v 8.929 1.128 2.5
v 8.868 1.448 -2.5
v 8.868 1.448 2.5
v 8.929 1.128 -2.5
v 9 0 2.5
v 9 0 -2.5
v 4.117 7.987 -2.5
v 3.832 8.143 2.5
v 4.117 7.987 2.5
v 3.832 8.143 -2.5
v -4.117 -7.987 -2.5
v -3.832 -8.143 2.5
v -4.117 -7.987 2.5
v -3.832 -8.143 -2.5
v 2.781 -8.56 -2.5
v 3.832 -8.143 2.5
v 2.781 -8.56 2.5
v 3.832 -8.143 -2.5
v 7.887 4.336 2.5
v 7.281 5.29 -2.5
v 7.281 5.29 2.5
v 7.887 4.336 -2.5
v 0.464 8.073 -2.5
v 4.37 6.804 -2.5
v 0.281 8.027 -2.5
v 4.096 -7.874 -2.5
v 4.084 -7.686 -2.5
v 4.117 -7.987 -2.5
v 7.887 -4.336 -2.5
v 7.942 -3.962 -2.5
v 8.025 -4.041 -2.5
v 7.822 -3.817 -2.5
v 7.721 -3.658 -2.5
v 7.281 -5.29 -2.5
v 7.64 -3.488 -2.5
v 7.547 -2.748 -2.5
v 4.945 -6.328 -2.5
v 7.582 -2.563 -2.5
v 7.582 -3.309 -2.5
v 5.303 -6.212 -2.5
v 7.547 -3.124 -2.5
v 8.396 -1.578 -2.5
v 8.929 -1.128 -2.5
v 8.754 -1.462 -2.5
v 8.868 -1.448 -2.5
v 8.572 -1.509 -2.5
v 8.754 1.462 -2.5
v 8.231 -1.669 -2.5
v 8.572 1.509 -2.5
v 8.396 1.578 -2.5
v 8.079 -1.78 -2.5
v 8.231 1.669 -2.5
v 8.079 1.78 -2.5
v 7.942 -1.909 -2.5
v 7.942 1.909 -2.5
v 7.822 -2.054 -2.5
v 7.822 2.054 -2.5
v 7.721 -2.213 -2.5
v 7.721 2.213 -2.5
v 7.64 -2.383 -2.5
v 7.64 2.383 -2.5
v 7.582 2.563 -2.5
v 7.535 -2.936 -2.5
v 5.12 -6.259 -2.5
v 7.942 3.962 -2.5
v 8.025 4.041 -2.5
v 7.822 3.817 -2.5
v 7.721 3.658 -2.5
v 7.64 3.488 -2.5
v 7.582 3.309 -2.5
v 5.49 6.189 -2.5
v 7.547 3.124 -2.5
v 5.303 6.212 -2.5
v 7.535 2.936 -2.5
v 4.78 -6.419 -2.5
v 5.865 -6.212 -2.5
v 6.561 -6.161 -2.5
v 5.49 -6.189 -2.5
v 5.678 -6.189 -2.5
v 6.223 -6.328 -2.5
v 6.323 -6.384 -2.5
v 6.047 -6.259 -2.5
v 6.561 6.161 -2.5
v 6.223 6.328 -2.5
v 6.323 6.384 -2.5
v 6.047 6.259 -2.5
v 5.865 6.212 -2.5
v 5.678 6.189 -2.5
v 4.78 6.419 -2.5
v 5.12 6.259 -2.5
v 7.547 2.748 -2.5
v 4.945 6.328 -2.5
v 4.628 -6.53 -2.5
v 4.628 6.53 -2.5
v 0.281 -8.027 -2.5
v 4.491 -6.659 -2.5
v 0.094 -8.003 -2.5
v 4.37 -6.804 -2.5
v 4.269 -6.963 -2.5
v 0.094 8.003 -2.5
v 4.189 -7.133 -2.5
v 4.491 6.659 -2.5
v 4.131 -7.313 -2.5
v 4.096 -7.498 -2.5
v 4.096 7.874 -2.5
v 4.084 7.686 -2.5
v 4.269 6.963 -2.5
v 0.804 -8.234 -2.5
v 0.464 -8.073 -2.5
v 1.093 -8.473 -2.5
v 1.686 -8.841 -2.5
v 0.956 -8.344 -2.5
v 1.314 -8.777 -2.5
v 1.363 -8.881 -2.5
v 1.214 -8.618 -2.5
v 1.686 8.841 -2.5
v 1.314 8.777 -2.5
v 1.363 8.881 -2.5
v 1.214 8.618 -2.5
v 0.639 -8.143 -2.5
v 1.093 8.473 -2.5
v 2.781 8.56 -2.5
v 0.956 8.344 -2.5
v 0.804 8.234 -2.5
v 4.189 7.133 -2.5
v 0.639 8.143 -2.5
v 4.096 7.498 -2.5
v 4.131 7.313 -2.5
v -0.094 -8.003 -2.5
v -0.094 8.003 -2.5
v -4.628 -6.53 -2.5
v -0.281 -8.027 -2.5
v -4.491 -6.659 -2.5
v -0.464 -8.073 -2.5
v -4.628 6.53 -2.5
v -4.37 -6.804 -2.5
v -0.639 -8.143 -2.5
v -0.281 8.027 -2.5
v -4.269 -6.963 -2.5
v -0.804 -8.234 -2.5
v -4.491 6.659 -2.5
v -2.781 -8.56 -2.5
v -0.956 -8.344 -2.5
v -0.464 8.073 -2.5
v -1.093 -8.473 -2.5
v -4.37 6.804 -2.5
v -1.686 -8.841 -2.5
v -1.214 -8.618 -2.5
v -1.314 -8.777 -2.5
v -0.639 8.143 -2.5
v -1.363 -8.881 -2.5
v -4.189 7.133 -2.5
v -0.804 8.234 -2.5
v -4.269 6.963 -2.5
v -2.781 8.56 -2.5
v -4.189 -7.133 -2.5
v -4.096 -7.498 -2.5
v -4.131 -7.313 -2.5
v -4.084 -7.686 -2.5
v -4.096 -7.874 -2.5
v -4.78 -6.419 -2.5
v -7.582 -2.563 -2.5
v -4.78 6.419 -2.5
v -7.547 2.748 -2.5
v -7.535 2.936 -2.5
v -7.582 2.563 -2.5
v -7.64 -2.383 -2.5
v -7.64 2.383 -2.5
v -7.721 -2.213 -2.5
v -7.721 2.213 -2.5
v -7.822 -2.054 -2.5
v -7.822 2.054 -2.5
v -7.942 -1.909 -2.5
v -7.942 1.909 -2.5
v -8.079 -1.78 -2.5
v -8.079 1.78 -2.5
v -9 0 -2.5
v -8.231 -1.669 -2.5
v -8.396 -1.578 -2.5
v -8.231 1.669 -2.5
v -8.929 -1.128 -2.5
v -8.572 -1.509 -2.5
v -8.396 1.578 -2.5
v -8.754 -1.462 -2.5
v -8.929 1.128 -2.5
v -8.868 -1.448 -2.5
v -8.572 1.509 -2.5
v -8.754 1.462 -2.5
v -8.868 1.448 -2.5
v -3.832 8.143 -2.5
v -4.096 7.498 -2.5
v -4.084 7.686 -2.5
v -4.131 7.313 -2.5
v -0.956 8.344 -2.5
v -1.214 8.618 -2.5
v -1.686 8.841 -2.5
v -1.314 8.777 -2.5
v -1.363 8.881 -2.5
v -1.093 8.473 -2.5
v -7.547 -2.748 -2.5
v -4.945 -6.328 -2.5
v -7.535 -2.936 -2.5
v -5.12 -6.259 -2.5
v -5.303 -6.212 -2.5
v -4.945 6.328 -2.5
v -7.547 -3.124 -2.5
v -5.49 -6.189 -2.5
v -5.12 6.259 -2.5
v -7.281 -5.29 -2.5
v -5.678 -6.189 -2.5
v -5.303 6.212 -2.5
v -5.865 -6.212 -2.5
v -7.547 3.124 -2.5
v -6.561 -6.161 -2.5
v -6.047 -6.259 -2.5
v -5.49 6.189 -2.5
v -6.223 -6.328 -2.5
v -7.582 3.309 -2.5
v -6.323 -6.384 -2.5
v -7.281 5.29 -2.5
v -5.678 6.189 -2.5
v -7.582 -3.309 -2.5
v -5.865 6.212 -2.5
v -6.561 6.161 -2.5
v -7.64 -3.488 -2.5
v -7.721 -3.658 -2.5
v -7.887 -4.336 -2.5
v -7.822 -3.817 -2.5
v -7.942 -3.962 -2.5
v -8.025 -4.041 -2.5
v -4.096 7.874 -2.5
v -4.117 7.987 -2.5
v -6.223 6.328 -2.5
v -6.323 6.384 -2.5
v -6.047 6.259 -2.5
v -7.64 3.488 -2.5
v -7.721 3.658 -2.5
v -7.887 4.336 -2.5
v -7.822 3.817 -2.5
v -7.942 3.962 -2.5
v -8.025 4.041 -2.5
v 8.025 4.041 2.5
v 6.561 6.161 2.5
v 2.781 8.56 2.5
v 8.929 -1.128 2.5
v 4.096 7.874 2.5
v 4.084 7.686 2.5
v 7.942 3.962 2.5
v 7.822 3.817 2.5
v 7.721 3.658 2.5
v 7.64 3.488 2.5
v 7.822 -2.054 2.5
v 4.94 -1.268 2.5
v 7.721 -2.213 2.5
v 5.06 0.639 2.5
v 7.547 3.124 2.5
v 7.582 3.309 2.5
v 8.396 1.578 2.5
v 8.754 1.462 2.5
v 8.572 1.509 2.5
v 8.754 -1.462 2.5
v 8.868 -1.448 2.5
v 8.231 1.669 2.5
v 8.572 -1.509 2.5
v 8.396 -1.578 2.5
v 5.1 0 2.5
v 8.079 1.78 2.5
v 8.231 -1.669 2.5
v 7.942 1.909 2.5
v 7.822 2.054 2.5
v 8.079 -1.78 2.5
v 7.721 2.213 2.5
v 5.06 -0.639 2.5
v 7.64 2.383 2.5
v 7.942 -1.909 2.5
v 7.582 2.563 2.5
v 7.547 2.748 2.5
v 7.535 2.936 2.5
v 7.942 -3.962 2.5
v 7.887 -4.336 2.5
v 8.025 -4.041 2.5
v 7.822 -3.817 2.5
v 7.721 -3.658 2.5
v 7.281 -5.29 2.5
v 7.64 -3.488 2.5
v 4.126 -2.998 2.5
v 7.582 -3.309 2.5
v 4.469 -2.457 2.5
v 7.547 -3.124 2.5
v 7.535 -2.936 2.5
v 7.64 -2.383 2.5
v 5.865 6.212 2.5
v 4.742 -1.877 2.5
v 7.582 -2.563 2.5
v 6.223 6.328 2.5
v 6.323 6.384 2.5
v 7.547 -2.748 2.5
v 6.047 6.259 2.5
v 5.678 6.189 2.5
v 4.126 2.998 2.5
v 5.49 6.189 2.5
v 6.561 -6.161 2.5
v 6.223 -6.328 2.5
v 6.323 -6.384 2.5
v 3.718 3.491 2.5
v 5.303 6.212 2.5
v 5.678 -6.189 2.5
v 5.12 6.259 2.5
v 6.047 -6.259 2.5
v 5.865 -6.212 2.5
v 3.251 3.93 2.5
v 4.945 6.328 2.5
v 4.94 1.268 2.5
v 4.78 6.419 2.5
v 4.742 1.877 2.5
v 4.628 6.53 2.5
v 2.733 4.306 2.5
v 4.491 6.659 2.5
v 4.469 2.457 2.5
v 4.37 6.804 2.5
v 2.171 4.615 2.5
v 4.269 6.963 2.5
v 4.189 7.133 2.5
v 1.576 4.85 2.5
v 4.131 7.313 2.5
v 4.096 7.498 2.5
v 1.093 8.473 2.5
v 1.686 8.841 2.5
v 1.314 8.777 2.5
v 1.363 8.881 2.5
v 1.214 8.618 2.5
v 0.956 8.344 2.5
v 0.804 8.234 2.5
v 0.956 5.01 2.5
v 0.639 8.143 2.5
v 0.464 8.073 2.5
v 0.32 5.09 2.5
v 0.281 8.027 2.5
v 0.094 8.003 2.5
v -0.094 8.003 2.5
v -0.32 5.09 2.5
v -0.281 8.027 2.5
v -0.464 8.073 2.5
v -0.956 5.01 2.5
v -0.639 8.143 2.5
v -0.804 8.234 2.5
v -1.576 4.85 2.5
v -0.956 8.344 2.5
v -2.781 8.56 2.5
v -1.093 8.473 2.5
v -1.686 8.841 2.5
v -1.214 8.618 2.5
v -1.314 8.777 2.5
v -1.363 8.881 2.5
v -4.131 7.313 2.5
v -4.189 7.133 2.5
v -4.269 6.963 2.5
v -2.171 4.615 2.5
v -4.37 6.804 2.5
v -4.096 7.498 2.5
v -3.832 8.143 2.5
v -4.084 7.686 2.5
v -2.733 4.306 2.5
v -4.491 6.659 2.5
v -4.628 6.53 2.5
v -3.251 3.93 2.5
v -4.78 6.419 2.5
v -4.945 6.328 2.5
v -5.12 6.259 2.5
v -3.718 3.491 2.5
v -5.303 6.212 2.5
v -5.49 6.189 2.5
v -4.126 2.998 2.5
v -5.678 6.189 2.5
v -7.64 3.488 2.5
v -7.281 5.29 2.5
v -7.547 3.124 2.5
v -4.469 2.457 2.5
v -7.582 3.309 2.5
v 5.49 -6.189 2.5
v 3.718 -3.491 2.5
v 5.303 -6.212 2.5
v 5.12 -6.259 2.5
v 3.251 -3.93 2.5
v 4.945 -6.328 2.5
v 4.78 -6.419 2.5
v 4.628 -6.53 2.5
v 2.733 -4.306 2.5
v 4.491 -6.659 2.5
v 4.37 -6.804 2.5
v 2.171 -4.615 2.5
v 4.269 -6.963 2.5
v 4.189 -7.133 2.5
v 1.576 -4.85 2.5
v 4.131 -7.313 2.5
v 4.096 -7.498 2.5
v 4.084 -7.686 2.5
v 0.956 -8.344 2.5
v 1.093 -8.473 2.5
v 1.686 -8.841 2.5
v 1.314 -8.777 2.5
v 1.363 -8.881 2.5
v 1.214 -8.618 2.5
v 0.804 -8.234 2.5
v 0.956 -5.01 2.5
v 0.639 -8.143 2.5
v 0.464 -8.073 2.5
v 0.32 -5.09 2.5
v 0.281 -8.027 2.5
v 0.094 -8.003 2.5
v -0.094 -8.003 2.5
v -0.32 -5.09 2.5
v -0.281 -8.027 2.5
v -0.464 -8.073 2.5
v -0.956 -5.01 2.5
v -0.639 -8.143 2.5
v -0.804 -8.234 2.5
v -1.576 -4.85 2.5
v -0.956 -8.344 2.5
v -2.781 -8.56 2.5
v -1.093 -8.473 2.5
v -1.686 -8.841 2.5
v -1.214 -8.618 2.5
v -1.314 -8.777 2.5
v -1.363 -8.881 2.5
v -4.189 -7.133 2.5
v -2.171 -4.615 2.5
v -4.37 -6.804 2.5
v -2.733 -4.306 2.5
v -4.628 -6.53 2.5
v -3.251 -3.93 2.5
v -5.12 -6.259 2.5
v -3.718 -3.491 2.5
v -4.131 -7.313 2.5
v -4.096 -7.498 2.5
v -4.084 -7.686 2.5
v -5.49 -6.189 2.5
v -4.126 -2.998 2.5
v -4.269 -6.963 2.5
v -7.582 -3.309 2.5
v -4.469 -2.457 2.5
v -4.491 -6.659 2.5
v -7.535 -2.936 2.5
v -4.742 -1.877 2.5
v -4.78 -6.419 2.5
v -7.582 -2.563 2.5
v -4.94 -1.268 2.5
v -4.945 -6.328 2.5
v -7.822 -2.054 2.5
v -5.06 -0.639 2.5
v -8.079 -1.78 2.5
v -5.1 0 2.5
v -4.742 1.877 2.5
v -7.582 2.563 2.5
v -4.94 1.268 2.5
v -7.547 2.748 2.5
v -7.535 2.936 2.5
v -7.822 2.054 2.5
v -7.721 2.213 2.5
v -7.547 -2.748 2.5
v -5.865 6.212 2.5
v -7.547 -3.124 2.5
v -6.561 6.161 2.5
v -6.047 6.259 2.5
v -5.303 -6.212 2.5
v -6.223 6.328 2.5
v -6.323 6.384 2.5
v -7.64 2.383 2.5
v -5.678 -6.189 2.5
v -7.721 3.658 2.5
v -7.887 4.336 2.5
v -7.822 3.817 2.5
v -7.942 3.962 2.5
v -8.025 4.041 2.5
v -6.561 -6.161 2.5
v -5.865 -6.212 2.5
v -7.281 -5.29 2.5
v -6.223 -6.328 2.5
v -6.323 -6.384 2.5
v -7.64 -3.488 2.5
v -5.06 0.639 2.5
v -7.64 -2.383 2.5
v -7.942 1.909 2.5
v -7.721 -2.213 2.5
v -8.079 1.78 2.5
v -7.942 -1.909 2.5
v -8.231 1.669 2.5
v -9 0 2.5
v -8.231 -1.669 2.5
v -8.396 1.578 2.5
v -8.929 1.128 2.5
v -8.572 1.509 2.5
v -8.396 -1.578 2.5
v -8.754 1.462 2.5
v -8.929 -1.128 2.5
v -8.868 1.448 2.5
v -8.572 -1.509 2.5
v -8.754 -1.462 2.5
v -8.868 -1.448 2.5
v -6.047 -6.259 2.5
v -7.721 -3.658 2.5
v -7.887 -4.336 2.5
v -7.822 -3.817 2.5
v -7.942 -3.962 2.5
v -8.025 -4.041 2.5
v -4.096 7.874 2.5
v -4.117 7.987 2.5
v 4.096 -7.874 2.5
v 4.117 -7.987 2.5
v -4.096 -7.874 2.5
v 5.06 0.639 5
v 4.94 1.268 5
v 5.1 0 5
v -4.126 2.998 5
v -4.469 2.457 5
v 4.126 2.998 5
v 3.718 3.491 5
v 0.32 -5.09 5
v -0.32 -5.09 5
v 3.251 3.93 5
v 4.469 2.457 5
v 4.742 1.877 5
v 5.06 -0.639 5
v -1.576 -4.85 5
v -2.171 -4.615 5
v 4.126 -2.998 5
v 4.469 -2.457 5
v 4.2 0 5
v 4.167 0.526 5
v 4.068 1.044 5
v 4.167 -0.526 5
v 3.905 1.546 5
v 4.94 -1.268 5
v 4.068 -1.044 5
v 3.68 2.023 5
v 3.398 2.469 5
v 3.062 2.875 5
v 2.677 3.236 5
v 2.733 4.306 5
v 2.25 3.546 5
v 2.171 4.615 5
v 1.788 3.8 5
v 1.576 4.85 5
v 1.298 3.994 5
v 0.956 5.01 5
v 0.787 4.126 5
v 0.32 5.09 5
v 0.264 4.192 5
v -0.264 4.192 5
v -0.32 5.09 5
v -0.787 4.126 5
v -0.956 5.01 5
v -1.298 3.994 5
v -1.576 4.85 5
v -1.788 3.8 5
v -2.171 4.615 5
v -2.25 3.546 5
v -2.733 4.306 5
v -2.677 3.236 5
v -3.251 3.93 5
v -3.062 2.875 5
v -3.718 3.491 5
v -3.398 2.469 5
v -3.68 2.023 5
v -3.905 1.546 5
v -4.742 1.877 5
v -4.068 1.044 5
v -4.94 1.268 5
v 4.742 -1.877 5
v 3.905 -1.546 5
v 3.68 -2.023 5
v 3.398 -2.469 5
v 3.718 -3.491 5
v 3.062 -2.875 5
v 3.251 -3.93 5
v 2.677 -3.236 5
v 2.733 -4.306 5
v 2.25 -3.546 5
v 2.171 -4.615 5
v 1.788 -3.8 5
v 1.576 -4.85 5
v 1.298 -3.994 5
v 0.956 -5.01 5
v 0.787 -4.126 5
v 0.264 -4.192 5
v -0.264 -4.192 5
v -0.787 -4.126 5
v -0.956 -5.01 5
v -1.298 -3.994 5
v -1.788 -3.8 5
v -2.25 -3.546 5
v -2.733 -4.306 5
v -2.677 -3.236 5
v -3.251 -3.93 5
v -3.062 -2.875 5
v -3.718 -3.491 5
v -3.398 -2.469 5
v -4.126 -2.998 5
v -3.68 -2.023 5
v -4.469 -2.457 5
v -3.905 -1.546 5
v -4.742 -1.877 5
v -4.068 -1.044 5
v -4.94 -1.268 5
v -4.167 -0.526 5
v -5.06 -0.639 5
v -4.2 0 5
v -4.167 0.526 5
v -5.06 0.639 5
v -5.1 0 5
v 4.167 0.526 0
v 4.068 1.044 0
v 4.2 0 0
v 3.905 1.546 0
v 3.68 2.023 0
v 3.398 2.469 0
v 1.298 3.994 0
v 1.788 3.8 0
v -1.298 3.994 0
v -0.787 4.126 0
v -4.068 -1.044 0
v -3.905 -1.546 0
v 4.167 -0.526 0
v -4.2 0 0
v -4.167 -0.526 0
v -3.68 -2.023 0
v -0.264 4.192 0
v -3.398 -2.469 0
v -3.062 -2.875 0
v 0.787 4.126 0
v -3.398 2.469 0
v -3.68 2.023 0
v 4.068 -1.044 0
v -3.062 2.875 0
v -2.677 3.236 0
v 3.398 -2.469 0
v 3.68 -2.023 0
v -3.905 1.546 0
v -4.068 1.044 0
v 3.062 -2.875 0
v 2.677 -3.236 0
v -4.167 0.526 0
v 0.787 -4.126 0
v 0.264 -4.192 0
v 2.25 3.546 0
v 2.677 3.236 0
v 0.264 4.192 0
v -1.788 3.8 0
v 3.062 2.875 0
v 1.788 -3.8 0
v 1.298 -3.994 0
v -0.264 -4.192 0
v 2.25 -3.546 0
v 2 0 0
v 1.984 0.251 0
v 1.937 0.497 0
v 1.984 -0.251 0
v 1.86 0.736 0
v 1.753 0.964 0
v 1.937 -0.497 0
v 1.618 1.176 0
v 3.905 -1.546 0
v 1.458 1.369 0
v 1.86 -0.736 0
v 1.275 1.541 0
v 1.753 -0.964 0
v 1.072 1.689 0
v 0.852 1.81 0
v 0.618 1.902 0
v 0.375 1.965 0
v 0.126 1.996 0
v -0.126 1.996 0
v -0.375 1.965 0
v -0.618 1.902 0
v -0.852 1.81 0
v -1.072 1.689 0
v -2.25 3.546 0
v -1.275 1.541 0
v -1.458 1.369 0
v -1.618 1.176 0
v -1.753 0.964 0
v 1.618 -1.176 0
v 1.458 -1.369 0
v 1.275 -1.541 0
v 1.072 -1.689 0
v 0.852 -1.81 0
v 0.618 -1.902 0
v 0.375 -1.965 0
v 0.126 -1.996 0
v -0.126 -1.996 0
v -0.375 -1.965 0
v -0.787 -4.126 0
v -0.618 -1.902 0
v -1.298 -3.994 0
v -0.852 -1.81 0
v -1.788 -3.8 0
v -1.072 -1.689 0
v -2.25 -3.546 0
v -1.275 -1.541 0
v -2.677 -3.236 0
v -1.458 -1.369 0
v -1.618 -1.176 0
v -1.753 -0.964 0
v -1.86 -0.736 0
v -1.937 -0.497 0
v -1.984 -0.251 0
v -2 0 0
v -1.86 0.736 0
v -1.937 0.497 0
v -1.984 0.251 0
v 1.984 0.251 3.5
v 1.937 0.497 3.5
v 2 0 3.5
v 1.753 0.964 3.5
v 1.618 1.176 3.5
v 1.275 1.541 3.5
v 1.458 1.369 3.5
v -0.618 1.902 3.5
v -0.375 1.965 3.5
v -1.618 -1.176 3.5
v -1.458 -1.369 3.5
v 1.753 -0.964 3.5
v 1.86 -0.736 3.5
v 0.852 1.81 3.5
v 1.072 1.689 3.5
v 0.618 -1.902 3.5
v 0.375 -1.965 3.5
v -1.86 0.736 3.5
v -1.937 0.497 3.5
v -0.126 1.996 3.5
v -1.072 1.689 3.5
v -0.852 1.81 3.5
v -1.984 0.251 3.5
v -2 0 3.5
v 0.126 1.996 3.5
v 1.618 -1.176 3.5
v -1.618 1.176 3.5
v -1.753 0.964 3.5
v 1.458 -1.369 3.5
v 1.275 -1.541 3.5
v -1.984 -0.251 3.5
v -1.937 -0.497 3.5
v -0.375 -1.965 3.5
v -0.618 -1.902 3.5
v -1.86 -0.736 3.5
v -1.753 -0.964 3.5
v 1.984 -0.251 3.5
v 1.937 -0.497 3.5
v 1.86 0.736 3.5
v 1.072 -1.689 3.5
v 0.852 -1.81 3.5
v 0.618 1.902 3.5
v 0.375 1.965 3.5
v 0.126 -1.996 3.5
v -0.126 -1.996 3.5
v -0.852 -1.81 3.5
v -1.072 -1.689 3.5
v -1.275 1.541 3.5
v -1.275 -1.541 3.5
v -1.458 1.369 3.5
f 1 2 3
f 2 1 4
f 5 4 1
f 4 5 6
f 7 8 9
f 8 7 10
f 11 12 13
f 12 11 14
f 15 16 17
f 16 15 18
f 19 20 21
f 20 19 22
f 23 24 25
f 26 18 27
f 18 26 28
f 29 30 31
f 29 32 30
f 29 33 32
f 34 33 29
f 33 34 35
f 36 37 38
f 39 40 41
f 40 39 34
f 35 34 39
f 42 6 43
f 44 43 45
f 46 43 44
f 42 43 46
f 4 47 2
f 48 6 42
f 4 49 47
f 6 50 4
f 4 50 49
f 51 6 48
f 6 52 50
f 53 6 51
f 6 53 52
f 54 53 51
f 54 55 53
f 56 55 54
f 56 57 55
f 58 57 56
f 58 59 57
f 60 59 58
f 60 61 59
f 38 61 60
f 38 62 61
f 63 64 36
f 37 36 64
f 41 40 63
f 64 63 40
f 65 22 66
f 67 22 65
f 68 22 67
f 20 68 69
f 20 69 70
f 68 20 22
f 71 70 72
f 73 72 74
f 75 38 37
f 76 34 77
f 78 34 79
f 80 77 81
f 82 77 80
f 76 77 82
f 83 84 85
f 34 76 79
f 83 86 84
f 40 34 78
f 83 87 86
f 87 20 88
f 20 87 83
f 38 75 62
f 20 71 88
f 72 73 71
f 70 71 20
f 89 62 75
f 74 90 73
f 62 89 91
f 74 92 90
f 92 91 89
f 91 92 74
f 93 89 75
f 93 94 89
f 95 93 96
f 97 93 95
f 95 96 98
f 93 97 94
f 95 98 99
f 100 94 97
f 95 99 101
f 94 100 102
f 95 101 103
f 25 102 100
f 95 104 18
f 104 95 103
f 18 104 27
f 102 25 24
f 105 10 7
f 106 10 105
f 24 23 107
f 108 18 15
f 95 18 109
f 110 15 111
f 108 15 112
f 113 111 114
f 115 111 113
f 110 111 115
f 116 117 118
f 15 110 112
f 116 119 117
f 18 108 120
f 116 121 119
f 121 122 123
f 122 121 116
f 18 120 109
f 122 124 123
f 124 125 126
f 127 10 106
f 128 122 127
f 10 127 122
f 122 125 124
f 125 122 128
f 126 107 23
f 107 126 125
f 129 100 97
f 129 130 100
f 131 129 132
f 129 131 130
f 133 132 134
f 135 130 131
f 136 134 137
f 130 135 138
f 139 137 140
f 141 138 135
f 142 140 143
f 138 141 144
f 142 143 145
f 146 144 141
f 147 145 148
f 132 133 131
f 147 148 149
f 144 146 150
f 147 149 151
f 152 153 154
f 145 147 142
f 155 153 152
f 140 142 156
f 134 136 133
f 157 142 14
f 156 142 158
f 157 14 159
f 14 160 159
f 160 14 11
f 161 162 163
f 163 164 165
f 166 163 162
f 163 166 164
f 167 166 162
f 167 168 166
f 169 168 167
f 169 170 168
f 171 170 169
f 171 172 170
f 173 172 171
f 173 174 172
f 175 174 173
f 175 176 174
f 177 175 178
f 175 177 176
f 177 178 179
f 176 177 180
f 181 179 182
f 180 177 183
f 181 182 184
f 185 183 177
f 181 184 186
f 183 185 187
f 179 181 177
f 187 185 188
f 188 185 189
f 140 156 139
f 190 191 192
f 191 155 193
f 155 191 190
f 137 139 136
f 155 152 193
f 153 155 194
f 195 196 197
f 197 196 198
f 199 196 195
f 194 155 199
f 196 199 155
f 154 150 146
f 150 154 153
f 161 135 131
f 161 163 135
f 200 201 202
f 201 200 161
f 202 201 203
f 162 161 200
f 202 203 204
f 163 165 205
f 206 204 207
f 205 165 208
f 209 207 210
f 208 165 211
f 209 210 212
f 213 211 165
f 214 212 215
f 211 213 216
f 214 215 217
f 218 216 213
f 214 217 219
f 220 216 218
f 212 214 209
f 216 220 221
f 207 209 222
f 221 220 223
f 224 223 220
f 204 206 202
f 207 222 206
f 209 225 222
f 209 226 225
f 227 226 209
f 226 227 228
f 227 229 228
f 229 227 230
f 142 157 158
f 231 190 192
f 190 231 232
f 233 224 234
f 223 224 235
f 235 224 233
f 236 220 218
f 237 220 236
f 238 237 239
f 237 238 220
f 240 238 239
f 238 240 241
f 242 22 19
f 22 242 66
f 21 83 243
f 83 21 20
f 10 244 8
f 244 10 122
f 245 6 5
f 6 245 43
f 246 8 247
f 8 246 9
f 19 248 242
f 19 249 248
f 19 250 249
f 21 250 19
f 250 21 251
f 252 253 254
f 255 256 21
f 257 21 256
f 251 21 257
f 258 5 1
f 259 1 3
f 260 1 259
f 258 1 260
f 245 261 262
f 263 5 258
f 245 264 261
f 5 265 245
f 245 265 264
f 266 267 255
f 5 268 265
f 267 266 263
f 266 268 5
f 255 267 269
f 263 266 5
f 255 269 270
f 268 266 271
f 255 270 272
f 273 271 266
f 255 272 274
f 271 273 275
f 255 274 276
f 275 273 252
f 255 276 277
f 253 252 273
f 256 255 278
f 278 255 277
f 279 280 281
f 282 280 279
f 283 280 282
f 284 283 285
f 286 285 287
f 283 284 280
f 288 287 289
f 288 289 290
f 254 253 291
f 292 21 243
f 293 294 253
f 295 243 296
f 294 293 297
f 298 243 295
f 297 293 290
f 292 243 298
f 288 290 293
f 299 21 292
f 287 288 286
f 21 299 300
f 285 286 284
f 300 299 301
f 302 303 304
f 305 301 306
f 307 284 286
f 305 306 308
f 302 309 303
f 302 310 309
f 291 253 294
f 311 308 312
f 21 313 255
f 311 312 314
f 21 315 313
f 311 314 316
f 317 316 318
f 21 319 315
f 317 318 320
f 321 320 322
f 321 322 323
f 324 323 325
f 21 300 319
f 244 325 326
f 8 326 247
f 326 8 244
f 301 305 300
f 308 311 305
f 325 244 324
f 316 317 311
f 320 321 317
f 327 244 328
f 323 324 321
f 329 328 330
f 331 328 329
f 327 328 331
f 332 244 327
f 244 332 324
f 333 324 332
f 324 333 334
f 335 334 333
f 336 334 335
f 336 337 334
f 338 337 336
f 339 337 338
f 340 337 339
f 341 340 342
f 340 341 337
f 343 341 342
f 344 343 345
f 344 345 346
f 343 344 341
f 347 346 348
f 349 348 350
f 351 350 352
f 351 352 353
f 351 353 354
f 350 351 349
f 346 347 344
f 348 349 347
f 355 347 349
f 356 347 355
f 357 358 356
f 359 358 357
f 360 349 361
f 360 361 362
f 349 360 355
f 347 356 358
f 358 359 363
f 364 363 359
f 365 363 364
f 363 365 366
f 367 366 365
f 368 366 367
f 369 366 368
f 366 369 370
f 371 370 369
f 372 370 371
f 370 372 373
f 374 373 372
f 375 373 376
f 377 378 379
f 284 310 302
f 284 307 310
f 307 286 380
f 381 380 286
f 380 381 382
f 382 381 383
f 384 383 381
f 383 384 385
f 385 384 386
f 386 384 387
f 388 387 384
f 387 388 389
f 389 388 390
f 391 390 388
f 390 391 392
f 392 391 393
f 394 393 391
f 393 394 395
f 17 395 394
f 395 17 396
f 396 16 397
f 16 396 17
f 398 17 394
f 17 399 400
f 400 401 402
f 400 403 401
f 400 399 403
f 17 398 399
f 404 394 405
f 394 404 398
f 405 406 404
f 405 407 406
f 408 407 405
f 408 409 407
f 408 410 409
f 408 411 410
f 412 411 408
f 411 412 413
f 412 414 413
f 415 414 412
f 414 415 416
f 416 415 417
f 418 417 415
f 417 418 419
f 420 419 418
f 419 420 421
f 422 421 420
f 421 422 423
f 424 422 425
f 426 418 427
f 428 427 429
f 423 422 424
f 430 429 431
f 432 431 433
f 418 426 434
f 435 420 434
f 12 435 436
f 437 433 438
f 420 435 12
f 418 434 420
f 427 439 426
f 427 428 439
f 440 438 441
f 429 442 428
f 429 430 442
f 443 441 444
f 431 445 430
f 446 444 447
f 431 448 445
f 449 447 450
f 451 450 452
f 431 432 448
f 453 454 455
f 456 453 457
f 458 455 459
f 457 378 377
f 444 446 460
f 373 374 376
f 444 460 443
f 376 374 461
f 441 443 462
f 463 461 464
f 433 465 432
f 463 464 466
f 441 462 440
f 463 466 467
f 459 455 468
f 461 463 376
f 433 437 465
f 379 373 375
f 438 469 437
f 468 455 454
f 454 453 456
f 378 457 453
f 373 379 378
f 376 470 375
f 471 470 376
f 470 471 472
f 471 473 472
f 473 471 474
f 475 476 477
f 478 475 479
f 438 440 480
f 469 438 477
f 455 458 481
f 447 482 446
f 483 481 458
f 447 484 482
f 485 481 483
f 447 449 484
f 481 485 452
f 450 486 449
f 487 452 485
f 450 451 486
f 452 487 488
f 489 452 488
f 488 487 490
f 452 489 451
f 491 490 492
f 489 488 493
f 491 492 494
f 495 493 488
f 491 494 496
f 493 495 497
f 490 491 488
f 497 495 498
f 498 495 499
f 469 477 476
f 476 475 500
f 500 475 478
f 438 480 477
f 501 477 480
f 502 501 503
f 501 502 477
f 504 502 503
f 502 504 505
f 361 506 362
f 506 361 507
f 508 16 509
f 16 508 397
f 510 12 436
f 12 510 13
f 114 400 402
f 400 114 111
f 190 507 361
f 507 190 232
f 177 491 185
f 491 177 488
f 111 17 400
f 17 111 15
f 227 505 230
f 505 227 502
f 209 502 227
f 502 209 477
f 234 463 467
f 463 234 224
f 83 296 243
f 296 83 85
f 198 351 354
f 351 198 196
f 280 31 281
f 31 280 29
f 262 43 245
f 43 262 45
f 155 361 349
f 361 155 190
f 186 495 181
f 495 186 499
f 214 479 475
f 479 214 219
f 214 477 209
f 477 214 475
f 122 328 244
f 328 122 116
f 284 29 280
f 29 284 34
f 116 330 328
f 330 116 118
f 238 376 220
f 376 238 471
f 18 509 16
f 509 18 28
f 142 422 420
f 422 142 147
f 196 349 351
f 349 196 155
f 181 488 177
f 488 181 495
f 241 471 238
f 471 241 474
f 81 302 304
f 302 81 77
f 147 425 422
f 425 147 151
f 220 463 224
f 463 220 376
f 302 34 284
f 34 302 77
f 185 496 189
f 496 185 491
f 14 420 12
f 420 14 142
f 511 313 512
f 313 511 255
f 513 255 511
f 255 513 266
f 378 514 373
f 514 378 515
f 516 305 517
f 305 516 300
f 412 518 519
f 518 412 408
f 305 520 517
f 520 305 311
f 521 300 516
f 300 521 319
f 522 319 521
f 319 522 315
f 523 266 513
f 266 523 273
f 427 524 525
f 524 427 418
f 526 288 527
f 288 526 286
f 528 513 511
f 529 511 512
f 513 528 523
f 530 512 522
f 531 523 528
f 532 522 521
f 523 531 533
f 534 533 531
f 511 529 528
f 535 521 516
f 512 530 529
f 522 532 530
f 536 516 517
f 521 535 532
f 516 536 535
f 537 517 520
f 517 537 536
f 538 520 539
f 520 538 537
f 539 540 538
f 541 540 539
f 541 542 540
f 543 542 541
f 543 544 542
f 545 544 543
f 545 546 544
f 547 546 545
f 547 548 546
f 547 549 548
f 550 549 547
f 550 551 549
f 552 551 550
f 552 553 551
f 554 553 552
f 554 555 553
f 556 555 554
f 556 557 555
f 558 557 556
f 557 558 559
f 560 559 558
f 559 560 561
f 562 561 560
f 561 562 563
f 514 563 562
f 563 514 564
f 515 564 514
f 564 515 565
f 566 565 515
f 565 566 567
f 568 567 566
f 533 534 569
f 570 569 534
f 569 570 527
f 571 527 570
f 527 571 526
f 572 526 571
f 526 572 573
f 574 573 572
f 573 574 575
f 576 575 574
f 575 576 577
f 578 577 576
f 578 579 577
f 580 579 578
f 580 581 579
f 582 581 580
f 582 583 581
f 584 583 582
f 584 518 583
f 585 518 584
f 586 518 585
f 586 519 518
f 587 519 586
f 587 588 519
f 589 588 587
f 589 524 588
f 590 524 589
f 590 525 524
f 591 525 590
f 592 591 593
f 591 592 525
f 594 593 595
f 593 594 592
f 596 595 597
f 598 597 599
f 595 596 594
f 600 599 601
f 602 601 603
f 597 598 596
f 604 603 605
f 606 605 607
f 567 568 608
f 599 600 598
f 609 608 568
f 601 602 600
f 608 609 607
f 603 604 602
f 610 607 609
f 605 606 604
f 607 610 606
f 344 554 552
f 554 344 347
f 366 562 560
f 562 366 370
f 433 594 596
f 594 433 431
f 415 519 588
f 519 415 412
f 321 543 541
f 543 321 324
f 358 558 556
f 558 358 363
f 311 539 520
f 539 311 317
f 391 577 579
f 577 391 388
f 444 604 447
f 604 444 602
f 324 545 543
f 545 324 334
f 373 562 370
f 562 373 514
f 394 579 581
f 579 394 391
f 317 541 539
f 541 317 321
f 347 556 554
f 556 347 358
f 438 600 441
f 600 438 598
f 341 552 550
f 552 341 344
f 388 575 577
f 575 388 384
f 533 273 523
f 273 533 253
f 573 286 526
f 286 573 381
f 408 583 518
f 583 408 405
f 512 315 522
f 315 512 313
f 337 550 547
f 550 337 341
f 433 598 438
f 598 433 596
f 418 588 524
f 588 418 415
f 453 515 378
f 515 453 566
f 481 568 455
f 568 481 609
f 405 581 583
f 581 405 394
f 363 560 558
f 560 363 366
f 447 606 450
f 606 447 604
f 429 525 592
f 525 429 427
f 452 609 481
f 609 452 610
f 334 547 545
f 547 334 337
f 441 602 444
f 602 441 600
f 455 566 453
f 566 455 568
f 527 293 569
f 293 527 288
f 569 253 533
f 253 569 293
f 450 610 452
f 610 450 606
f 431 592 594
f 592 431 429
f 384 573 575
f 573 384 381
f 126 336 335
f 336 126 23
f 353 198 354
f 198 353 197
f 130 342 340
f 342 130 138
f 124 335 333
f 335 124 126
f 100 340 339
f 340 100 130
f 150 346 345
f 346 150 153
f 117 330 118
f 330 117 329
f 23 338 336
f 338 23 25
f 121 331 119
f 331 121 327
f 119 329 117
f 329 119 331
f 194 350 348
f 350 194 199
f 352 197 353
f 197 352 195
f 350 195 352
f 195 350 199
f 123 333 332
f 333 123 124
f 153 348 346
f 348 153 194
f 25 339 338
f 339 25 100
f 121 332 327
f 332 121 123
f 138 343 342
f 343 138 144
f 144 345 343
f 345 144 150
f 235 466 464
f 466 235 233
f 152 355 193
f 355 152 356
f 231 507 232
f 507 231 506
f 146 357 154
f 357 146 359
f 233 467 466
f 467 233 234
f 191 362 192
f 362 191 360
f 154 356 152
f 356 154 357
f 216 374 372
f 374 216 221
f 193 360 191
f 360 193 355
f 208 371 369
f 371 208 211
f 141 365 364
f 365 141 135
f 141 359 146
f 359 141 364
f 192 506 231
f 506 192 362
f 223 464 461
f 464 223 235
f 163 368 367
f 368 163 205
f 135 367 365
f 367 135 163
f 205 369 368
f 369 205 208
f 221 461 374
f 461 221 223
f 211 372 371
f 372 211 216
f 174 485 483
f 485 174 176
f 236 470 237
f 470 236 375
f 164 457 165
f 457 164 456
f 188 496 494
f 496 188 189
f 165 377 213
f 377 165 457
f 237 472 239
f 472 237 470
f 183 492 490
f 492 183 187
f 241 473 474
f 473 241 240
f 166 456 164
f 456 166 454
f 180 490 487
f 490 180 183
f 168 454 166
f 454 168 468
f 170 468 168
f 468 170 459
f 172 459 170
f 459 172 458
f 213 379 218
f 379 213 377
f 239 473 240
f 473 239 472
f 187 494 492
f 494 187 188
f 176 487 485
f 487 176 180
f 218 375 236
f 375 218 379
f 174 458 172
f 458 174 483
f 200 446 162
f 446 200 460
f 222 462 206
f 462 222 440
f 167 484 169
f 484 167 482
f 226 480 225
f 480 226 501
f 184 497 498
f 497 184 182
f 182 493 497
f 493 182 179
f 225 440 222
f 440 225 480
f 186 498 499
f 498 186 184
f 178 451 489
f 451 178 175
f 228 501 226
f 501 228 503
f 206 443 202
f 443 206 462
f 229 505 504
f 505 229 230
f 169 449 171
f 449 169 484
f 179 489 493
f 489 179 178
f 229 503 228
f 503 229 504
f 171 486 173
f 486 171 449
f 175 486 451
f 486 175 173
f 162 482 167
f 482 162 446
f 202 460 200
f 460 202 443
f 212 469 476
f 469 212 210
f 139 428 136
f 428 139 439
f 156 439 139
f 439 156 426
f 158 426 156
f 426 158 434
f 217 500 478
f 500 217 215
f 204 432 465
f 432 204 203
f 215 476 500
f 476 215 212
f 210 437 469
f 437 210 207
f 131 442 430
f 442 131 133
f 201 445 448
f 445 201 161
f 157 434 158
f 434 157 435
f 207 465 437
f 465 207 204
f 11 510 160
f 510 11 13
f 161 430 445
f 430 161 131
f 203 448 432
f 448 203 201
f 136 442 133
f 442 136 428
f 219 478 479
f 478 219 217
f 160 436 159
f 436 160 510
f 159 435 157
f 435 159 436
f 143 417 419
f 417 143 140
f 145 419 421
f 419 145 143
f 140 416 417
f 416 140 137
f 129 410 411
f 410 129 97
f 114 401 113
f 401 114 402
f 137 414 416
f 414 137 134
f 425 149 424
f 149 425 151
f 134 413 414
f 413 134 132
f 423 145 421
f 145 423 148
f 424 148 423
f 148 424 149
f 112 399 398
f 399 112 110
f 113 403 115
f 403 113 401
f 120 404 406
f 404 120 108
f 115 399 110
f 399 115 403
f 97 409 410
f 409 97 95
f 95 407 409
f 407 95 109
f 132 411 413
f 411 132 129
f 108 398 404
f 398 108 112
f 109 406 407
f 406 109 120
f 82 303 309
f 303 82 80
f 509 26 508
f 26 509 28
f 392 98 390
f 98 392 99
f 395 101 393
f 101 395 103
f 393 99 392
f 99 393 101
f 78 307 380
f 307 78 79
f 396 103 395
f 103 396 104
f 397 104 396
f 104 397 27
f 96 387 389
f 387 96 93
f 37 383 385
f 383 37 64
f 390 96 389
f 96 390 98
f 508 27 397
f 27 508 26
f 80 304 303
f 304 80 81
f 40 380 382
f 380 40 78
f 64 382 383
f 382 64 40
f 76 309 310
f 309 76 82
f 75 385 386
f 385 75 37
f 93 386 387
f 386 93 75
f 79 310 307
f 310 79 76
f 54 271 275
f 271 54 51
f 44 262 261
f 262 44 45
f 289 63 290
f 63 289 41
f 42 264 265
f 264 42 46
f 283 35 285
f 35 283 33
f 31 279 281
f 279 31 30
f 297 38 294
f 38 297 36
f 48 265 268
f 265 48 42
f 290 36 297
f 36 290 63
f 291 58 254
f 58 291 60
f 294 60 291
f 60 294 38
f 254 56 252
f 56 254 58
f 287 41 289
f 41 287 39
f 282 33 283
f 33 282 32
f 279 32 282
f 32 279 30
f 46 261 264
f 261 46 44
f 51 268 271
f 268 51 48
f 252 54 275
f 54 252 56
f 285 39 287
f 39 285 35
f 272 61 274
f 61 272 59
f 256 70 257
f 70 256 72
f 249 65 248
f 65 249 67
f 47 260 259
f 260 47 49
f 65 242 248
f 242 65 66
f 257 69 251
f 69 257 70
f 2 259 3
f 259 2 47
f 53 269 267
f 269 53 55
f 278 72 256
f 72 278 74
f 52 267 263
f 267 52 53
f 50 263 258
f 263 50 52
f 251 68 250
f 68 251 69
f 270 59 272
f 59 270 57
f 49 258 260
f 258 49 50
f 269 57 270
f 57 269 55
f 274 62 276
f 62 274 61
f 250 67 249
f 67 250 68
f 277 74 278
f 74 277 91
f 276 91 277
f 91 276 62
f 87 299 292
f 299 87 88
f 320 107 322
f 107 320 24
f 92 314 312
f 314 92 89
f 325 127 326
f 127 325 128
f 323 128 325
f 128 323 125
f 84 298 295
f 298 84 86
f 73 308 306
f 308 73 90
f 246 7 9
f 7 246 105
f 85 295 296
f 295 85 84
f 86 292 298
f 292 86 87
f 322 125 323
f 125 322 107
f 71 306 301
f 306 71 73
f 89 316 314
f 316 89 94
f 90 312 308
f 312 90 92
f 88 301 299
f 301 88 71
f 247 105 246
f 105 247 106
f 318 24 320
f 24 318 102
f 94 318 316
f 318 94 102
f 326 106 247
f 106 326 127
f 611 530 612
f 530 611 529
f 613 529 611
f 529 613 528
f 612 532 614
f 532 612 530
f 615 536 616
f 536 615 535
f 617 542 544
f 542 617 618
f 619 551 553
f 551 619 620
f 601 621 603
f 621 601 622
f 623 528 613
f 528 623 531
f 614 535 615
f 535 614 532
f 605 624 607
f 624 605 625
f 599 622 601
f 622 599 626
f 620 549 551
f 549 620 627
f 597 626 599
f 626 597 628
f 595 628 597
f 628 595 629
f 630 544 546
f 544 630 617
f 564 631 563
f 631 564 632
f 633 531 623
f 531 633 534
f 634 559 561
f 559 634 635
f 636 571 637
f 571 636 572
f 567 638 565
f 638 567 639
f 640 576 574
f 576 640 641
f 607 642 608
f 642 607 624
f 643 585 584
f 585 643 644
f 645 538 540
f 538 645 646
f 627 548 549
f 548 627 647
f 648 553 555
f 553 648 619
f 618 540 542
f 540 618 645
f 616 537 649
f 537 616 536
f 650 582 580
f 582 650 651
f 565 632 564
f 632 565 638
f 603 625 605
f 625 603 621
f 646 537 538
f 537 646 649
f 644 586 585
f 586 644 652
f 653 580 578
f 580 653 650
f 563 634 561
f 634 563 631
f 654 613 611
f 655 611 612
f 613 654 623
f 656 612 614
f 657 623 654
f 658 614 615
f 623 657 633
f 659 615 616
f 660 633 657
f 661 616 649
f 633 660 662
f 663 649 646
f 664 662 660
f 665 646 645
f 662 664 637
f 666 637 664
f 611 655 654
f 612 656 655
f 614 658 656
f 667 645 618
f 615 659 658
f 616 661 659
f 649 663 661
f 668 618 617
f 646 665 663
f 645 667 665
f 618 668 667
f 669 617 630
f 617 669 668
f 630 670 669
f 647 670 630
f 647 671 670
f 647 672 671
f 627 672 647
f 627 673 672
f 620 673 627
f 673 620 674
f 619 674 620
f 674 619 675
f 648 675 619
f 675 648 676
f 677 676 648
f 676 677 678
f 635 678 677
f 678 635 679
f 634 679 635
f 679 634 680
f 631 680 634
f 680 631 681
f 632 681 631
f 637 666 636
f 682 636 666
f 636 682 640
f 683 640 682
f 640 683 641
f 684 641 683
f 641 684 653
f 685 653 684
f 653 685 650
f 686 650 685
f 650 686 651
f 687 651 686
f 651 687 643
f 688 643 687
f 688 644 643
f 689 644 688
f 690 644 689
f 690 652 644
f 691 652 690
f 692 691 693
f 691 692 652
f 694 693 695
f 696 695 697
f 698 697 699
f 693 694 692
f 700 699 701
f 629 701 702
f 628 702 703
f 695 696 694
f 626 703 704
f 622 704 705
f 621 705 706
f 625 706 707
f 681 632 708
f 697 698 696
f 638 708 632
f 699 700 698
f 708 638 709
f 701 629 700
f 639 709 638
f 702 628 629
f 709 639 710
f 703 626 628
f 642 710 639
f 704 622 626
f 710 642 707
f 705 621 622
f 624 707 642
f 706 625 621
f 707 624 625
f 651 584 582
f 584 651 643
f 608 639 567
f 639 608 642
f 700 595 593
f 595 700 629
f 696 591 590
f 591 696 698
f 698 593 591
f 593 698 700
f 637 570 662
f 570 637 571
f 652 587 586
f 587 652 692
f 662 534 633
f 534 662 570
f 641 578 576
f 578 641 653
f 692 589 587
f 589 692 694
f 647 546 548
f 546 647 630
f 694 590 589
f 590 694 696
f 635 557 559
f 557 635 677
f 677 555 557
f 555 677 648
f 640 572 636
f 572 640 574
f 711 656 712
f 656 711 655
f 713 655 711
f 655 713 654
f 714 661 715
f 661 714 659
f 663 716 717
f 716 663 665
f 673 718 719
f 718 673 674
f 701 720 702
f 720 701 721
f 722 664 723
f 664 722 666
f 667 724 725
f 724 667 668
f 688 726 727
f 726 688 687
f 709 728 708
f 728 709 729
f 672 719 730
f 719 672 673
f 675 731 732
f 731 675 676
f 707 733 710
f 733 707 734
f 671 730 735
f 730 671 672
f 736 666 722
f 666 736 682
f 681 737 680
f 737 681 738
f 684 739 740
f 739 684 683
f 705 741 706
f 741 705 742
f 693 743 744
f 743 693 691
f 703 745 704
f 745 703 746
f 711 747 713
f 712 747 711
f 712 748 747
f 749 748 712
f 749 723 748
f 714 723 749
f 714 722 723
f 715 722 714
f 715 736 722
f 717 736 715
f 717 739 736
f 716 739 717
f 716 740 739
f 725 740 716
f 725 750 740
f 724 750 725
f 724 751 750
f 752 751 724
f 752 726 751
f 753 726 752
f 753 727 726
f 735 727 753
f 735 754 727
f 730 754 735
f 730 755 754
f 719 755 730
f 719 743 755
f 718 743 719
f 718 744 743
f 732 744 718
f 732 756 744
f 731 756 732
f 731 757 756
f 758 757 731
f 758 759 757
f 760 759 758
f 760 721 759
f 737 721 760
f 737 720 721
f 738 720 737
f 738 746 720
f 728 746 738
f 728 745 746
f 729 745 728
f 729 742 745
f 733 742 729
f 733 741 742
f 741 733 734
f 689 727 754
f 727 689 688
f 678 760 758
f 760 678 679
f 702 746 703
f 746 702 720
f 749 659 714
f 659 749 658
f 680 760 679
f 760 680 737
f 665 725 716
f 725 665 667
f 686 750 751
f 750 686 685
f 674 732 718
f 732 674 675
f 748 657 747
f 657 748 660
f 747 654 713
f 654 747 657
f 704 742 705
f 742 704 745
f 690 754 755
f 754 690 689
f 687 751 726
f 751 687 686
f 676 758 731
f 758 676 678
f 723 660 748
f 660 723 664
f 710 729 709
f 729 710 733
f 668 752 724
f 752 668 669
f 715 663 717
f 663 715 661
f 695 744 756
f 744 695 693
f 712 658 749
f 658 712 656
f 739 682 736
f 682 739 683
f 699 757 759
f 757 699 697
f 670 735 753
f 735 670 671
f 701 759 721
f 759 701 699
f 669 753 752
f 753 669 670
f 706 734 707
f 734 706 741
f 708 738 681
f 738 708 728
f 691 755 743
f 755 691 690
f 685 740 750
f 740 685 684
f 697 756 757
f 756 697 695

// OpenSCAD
$fn=50;
union() 
{
	difference() 
	{
		union() 
		{
			cylinder(h = 5, r = 9, center=true);
			translate([0,0,2.5]) cylinder(h=5, r=5.1, center=true);
		}

		translate ([0,0,2.5]) cylinder(h=5, r=4.2, center=true);

		for ( i = [0:36:359] ) rotate ([0,0,i])
		{
			translate([0, 9.5, -2.5])
				#cylinder(h=5.01, r = 1.5);
		}
	}

	cylinder(h=3.5, r=2.0);
}
